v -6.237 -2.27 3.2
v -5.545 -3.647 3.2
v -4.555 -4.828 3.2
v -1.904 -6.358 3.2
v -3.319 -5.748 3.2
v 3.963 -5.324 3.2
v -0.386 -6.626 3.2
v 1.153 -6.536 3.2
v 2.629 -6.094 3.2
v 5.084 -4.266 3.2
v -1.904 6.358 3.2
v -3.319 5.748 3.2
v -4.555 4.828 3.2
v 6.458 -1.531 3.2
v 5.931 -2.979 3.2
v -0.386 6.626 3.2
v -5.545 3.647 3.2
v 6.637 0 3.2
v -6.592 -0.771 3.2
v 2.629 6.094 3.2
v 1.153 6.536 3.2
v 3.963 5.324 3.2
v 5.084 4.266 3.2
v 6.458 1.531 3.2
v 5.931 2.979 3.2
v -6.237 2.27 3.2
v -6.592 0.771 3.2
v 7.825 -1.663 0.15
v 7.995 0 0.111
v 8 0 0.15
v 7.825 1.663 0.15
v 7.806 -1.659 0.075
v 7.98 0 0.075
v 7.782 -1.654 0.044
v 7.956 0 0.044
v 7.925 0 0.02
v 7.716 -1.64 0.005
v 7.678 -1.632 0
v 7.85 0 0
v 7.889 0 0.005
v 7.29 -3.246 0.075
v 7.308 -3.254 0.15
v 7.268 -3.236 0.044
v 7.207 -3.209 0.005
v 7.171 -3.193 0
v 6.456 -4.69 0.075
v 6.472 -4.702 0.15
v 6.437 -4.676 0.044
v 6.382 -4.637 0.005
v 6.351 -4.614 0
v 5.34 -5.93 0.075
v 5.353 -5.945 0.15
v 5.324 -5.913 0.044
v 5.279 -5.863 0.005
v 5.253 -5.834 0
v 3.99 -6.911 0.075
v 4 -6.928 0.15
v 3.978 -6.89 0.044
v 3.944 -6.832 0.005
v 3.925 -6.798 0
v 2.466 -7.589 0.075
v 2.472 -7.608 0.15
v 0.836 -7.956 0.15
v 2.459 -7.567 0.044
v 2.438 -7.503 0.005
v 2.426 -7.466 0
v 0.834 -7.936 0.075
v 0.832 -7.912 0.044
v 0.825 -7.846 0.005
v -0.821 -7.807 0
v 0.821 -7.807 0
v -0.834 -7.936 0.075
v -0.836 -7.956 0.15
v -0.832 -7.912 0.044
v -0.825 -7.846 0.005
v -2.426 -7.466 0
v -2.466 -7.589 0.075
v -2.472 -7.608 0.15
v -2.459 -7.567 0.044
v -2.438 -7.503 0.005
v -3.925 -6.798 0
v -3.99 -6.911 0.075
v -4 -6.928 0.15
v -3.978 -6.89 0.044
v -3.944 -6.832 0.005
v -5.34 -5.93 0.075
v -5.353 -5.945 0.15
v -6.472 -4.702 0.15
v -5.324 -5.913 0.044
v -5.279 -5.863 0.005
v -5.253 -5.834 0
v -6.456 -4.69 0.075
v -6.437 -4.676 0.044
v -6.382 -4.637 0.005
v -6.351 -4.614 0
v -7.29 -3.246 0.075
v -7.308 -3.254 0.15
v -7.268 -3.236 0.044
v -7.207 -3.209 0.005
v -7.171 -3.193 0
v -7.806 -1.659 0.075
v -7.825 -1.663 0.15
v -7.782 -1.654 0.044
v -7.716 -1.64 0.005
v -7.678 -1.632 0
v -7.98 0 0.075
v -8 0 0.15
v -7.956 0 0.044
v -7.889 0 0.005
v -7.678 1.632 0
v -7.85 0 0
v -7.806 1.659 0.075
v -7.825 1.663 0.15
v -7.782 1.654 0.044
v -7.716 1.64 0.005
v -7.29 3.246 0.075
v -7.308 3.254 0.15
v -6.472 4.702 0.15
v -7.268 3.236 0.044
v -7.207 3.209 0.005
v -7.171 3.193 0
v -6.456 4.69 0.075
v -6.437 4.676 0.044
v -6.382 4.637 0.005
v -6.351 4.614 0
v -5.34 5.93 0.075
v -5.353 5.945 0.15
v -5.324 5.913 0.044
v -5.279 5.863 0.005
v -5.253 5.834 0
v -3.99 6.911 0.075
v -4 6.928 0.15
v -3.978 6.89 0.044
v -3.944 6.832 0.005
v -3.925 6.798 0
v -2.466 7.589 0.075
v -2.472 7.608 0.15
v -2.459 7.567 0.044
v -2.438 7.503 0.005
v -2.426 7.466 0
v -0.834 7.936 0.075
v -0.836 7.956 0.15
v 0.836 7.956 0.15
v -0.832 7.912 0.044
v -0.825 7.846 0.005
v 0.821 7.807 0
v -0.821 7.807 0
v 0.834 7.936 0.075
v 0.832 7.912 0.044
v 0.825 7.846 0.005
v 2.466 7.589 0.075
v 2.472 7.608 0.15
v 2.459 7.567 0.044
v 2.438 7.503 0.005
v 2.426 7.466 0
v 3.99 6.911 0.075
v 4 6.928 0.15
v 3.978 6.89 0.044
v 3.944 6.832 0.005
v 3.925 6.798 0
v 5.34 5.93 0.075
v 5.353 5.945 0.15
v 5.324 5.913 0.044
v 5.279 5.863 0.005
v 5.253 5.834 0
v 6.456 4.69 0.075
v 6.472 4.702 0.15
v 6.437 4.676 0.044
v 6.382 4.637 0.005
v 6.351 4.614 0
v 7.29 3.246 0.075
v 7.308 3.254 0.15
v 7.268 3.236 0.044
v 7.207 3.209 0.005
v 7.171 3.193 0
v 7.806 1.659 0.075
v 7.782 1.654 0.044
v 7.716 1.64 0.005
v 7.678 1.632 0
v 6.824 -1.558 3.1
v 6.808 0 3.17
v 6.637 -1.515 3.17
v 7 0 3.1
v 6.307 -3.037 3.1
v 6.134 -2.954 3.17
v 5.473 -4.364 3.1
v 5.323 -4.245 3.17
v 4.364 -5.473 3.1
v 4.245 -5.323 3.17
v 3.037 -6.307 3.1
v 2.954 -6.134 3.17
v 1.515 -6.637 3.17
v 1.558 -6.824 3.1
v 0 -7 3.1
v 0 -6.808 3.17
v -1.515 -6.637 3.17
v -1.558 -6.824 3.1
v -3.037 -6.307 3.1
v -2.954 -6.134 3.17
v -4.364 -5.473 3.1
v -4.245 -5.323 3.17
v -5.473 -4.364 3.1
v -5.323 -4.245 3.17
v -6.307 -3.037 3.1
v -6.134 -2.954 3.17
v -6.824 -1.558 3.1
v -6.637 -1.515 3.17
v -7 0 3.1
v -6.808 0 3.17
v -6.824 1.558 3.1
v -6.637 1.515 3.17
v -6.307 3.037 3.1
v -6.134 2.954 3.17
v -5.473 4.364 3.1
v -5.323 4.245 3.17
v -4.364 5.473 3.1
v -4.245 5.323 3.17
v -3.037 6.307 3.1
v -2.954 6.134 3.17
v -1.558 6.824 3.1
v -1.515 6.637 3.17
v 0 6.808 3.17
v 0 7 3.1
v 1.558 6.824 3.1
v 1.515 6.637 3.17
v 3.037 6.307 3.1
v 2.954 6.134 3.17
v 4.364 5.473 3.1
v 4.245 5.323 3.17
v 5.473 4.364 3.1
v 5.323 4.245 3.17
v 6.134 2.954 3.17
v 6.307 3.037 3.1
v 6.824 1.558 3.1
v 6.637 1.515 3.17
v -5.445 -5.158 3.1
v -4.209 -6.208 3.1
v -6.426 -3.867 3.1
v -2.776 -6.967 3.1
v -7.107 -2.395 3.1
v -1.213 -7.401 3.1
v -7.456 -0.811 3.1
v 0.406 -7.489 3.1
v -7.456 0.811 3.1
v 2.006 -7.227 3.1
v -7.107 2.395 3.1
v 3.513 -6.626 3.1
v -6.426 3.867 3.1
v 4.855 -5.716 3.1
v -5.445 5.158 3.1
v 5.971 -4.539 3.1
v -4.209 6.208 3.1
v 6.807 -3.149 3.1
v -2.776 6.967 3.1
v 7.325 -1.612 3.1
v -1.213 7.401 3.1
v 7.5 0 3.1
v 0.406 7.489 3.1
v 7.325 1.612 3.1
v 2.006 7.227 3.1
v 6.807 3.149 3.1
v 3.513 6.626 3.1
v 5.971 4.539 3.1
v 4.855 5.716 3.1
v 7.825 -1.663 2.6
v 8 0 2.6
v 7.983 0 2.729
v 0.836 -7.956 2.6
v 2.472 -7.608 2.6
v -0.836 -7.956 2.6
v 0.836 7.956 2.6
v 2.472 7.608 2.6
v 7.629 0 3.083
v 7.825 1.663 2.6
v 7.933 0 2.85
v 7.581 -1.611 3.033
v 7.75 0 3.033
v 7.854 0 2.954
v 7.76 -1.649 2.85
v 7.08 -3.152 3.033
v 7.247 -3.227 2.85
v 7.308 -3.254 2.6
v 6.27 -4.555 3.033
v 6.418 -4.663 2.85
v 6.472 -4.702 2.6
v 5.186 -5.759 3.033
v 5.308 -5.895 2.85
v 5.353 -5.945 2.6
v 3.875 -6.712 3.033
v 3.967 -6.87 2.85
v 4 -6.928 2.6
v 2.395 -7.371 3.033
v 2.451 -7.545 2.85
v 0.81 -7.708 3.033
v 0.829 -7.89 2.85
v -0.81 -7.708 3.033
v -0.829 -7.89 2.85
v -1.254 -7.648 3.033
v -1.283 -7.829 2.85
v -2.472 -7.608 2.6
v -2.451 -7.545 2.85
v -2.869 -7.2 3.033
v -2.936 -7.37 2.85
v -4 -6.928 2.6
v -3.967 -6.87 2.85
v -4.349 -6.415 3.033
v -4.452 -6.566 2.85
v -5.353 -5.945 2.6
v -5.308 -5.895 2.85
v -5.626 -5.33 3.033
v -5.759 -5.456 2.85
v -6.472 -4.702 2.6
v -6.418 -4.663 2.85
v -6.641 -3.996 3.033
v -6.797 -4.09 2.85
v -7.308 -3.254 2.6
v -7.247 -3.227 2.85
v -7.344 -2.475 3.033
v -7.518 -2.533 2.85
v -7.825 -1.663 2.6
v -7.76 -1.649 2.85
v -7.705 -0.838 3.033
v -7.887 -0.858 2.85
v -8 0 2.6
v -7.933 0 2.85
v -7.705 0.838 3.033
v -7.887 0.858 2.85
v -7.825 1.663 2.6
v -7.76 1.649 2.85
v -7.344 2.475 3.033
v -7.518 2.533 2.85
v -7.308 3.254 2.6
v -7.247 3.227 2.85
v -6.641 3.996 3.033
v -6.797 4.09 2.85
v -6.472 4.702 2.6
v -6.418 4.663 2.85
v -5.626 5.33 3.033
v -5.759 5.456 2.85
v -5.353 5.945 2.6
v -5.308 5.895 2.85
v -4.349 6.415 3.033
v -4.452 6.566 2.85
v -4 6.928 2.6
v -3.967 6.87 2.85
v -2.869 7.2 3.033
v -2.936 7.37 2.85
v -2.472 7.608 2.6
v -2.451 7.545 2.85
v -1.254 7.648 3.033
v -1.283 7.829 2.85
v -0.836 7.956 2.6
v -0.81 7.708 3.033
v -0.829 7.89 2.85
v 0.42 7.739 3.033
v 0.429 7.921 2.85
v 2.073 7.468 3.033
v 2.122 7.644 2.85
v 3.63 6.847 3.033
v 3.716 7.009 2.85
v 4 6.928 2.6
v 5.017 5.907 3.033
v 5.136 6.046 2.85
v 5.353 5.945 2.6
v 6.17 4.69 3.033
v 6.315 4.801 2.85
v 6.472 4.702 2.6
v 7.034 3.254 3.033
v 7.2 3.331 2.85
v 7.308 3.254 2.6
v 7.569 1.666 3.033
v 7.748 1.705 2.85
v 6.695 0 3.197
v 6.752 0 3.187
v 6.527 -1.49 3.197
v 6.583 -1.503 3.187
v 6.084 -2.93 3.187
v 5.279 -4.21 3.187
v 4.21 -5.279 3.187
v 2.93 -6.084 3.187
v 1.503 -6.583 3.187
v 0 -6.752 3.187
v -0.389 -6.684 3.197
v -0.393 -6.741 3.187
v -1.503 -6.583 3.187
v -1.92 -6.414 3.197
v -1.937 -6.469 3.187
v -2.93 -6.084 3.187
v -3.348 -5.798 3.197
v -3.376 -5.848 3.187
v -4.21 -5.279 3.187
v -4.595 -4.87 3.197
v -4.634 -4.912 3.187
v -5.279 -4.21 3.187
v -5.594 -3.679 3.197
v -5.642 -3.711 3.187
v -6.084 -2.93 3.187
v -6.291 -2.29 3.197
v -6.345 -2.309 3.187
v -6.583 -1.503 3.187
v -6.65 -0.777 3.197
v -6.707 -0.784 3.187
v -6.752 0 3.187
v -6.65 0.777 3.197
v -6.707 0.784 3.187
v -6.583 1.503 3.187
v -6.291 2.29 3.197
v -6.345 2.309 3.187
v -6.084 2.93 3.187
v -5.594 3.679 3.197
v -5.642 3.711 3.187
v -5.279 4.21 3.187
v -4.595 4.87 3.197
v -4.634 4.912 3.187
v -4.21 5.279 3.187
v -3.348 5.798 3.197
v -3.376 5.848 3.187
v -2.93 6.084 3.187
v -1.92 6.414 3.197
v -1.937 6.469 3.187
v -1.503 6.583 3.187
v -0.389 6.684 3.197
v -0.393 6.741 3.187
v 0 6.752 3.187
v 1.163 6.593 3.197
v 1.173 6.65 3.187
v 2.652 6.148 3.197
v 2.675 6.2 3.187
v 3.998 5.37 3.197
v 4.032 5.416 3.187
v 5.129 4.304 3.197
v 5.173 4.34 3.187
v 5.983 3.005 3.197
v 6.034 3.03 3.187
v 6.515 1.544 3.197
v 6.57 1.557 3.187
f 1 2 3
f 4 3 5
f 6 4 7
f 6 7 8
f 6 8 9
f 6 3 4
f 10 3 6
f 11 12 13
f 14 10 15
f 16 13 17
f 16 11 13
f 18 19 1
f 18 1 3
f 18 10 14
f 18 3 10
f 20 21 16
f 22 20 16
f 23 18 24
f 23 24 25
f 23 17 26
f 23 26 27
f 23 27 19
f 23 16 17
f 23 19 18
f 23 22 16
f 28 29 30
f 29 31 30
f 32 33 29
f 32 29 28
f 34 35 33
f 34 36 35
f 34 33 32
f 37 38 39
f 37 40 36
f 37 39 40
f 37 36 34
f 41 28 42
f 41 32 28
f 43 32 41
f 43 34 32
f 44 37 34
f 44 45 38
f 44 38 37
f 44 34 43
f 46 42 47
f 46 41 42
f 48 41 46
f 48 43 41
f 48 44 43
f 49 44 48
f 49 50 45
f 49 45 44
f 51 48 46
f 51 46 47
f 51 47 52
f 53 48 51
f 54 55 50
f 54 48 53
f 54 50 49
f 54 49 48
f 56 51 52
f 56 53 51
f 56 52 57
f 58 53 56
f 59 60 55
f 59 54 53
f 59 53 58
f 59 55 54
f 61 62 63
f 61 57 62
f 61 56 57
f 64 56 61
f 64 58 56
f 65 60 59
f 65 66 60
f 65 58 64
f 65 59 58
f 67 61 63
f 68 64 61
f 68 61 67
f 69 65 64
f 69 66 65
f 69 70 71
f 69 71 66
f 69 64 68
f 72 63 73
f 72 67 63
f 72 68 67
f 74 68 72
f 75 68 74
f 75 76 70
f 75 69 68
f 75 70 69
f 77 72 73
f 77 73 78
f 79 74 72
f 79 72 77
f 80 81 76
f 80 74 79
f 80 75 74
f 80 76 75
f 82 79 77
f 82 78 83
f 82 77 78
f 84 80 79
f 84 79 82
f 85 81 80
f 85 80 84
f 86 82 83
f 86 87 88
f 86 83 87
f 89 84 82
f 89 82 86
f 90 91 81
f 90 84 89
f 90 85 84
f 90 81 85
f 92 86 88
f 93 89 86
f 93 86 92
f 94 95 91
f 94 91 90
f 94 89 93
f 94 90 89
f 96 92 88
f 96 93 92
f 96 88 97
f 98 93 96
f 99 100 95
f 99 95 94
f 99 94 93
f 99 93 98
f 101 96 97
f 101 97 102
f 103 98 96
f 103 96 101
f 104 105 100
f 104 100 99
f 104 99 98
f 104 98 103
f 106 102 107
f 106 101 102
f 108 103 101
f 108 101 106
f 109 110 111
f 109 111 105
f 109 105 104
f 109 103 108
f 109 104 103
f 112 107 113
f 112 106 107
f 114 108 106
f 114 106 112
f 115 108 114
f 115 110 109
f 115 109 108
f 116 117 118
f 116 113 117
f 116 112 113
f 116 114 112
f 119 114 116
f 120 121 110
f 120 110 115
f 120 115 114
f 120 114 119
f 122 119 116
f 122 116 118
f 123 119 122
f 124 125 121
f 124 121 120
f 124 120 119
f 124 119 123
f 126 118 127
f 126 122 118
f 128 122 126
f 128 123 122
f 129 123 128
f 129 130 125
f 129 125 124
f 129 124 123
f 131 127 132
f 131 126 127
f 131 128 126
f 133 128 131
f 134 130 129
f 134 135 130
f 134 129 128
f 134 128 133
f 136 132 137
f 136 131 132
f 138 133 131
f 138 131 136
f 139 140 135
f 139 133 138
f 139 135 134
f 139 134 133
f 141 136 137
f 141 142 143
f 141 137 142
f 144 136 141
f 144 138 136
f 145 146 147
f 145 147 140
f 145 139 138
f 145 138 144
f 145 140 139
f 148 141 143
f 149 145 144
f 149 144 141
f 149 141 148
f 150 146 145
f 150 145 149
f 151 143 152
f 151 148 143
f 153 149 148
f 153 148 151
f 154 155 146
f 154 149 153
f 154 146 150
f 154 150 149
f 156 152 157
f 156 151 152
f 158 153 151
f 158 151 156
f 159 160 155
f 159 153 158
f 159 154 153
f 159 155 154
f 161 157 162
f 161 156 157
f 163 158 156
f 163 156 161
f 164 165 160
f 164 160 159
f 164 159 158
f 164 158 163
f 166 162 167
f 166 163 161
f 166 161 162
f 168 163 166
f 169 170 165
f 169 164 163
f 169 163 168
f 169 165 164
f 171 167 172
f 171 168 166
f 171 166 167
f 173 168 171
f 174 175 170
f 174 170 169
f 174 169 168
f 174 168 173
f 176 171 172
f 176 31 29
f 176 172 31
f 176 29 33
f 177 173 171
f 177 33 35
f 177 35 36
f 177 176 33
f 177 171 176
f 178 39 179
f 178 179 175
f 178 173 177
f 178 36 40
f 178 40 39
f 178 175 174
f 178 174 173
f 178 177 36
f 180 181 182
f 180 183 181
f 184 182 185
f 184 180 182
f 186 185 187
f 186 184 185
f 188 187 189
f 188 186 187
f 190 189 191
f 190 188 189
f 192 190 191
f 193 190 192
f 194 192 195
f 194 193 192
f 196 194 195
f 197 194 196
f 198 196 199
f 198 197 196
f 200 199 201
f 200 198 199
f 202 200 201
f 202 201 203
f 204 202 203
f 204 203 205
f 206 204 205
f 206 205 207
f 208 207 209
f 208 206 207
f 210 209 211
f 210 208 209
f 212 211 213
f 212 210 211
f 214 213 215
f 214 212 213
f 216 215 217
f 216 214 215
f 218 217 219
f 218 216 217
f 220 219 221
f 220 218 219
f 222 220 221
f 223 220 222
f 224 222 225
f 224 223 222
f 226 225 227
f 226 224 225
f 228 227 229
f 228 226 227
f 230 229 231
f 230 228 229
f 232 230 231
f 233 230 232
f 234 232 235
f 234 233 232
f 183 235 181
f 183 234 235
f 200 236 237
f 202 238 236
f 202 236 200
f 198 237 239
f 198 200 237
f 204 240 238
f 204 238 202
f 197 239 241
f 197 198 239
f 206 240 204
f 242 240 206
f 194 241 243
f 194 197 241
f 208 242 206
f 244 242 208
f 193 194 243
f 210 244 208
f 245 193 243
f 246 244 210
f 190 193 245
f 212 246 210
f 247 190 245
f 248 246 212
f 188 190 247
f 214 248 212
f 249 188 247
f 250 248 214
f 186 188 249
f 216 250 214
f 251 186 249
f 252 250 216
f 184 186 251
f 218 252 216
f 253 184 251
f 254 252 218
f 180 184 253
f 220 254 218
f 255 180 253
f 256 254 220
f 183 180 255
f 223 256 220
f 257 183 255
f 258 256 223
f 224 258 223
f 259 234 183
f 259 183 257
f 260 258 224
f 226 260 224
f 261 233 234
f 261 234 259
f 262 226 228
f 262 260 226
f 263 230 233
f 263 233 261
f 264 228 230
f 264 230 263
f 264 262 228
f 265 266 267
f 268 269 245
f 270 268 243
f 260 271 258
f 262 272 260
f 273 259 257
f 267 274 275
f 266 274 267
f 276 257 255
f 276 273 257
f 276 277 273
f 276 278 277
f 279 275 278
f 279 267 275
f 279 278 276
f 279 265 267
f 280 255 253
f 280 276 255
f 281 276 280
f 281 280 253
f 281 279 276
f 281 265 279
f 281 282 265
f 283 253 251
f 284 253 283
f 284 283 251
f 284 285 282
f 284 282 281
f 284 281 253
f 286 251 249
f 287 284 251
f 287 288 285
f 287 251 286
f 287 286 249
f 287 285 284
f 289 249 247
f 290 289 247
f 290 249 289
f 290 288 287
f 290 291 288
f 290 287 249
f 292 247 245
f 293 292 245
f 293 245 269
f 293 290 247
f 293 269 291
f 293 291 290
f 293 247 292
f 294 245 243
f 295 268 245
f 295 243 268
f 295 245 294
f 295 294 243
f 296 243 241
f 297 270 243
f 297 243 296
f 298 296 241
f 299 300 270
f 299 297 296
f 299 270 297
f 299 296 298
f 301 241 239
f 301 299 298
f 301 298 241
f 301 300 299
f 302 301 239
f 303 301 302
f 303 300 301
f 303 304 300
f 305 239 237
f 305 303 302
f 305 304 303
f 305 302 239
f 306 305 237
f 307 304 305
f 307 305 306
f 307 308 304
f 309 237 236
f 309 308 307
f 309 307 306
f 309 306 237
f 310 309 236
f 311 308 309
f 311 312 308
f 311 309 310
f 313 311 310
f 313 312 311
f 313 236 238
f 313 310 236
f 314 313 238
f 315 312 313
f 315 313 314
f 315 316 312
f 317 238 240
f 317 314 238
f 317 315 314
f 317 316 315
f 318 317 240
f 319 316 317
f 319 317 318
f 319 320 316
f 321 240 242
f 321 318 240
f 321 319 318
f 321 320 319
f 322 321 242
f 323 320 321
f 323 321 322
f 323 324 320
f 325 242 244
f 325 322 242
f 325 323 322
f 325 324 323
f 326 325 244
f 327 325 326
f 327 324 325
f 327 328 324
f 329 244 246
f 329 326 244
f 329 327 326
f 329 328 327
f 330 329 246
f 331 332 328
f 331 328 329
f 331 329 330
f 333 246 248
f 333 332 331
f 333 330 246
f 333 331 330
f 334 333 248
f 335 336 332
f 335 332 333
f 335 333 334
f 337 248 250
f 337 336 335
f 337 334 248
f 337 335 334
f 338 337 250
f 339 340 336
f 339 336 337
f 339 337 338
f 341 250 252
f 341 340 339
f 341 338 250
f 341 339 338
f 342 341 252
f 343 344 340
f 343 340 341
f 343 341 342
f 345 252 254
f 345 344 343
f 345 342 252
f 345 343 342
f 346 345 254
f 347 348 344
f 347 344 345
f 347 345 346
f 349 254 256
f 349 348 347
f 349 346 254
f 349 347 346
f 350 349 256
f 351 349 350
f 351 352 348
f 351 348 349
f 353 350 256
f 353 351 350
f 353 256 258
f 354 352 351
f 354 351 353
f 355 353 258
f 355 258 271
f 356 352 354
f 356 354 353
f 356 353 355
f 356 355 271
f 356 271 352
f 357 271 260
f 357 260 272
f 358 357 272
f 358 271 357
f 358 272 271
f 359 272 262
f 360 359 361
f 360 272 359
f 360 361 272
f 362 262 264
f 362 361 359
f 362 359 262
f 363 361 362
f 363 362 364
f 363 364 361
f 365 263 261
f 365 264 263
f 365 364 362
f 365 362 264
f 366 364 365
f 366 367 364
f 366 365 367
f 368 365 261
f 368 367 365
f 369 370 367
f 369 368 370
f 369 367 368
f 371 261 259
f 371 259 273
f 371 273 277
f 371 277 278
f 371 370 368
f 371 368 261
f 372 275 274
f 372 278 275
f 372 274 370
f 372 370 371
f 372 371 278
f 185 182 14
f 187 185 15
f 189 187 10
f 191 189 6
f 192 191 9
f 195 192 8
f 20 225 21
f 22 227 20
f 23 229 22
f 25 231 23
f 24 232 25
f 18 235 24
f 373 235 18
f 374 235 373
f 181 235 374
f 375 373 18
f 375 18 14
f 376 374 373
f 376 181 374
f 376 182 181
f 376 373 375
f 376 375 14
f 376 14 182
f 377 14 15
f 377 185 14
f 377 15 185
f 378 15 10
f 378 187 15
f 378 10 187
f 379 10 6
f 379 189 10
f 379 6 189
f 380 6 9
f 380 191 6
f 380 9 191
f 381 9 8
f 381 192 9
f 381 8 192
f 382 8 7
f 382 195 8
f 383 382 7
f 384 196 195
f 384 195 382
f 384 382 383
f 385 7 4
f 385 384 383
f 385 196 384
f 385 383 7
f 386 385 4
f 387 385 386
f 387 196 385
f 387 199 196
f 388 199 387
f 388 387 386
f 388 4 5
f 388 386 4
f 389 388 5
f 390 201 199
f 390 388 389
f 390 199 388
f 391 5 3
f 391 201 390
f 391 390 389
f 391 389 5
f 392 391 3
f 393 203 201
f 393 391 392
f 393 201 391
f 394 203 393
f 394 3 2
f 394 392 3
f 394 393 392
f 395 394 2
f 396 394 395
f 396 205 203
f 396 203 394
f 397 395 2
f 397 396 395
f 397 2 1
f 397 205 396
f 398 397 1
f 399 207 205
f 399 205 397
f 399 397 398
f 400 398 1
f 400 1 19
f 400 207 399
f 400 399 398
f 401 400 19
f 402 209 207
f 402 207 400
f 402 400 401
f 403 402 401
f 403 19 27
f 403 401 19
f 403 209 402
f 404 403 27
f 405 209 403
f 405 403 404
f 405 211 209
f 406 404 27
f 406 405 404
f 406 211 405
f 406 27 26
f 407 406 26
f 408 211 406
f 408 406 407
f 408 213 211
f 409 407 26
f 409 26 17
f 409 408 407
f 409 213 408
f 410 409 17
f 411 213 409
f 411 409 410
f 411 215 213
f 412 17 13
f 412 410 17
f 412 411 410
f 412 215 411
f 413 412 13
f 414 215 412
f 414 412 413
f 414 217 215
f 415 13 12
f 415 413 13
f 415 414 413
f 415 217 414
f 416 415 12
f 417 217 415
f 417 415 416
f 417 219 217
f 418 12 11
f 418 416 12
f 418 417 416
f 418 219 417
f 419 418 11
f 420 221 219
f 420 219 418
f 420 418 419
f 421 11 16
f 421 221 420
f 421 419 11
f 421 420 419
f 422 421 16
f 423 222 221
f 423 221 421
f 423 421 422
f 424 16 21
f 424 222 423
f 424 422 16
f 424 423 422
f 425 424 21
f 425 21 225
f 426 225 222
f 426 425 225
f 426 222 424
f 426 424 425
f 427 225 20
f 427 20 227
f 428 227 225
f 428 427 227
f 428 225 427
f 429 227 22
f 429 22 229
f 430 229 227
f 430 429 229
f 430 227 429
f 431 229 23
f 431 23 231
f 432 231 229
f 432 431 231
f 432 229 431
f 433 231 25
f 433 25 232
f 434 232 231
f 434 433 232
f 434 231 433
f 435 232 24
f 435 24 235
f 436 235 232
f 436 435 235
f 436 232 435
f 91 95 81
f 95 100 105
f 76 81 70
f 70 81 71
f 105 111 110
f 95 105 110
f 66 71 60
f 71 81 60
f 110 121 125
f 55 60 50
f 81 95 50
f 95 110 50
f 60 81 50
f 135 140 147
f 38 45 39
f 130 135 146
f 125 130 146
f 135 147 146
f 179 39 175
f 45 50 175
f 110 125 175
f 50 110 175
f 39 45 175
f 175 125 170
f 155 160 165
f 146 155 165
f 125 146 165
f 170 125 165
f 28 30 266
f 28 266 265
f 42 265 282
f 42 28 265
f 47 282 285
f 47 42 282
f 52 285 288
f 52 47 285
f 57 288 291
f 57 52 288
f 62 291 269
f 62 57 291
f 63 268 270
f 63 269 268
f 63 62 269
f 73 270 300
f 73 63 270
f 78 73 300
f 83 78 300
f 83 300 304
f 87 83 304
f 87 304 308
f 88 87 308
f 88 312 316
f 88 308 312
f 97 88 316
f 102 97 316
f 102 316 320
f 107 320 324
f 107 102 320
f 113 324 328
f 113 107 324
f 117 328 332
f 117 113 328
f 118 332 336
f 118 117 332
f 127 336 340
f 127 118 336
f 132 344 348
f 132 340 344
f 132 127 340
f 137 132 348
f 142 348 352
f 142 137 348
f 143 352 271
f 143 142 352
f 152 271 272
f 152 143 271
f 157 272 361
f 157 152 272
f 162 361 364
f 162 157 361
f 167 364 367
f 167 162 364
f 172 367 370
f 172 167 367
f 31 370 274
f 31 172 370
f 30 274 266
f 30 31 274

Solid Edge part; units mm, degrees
sketch "Sketch1" plane through (0, 0, 0) normal (0, -1, 0) x (1, 0, 0)
  line L0 (0, 3.2) -> (6.7253, 3.2)
  line L1 (6.7253, 3.2) -> (7, 3.1)
  line L2 (7, 3.1) -> (8, 3.1)
  line L3 (8, 3.1) -> (8, 0)
  line L4 (8, 0) -> (0, 0)
  dimension "D1" = 8
  dimension "D2" = 7
  dimension "D3" = 0.1
  dimension "D4" = 3.2
revolve "RevolvedProtrusion1" add sketch "Sketch1" angle 360 about axis through (0, 0, 0) along (0, 0, 1)
fillet "Round1" radius 0.5 2 edges at (-8, 0, 3.1) (-6.7253, 0, 3.2)
fillet "Round_2" radius 0.15 1 edges at (-8, 0, 0)
